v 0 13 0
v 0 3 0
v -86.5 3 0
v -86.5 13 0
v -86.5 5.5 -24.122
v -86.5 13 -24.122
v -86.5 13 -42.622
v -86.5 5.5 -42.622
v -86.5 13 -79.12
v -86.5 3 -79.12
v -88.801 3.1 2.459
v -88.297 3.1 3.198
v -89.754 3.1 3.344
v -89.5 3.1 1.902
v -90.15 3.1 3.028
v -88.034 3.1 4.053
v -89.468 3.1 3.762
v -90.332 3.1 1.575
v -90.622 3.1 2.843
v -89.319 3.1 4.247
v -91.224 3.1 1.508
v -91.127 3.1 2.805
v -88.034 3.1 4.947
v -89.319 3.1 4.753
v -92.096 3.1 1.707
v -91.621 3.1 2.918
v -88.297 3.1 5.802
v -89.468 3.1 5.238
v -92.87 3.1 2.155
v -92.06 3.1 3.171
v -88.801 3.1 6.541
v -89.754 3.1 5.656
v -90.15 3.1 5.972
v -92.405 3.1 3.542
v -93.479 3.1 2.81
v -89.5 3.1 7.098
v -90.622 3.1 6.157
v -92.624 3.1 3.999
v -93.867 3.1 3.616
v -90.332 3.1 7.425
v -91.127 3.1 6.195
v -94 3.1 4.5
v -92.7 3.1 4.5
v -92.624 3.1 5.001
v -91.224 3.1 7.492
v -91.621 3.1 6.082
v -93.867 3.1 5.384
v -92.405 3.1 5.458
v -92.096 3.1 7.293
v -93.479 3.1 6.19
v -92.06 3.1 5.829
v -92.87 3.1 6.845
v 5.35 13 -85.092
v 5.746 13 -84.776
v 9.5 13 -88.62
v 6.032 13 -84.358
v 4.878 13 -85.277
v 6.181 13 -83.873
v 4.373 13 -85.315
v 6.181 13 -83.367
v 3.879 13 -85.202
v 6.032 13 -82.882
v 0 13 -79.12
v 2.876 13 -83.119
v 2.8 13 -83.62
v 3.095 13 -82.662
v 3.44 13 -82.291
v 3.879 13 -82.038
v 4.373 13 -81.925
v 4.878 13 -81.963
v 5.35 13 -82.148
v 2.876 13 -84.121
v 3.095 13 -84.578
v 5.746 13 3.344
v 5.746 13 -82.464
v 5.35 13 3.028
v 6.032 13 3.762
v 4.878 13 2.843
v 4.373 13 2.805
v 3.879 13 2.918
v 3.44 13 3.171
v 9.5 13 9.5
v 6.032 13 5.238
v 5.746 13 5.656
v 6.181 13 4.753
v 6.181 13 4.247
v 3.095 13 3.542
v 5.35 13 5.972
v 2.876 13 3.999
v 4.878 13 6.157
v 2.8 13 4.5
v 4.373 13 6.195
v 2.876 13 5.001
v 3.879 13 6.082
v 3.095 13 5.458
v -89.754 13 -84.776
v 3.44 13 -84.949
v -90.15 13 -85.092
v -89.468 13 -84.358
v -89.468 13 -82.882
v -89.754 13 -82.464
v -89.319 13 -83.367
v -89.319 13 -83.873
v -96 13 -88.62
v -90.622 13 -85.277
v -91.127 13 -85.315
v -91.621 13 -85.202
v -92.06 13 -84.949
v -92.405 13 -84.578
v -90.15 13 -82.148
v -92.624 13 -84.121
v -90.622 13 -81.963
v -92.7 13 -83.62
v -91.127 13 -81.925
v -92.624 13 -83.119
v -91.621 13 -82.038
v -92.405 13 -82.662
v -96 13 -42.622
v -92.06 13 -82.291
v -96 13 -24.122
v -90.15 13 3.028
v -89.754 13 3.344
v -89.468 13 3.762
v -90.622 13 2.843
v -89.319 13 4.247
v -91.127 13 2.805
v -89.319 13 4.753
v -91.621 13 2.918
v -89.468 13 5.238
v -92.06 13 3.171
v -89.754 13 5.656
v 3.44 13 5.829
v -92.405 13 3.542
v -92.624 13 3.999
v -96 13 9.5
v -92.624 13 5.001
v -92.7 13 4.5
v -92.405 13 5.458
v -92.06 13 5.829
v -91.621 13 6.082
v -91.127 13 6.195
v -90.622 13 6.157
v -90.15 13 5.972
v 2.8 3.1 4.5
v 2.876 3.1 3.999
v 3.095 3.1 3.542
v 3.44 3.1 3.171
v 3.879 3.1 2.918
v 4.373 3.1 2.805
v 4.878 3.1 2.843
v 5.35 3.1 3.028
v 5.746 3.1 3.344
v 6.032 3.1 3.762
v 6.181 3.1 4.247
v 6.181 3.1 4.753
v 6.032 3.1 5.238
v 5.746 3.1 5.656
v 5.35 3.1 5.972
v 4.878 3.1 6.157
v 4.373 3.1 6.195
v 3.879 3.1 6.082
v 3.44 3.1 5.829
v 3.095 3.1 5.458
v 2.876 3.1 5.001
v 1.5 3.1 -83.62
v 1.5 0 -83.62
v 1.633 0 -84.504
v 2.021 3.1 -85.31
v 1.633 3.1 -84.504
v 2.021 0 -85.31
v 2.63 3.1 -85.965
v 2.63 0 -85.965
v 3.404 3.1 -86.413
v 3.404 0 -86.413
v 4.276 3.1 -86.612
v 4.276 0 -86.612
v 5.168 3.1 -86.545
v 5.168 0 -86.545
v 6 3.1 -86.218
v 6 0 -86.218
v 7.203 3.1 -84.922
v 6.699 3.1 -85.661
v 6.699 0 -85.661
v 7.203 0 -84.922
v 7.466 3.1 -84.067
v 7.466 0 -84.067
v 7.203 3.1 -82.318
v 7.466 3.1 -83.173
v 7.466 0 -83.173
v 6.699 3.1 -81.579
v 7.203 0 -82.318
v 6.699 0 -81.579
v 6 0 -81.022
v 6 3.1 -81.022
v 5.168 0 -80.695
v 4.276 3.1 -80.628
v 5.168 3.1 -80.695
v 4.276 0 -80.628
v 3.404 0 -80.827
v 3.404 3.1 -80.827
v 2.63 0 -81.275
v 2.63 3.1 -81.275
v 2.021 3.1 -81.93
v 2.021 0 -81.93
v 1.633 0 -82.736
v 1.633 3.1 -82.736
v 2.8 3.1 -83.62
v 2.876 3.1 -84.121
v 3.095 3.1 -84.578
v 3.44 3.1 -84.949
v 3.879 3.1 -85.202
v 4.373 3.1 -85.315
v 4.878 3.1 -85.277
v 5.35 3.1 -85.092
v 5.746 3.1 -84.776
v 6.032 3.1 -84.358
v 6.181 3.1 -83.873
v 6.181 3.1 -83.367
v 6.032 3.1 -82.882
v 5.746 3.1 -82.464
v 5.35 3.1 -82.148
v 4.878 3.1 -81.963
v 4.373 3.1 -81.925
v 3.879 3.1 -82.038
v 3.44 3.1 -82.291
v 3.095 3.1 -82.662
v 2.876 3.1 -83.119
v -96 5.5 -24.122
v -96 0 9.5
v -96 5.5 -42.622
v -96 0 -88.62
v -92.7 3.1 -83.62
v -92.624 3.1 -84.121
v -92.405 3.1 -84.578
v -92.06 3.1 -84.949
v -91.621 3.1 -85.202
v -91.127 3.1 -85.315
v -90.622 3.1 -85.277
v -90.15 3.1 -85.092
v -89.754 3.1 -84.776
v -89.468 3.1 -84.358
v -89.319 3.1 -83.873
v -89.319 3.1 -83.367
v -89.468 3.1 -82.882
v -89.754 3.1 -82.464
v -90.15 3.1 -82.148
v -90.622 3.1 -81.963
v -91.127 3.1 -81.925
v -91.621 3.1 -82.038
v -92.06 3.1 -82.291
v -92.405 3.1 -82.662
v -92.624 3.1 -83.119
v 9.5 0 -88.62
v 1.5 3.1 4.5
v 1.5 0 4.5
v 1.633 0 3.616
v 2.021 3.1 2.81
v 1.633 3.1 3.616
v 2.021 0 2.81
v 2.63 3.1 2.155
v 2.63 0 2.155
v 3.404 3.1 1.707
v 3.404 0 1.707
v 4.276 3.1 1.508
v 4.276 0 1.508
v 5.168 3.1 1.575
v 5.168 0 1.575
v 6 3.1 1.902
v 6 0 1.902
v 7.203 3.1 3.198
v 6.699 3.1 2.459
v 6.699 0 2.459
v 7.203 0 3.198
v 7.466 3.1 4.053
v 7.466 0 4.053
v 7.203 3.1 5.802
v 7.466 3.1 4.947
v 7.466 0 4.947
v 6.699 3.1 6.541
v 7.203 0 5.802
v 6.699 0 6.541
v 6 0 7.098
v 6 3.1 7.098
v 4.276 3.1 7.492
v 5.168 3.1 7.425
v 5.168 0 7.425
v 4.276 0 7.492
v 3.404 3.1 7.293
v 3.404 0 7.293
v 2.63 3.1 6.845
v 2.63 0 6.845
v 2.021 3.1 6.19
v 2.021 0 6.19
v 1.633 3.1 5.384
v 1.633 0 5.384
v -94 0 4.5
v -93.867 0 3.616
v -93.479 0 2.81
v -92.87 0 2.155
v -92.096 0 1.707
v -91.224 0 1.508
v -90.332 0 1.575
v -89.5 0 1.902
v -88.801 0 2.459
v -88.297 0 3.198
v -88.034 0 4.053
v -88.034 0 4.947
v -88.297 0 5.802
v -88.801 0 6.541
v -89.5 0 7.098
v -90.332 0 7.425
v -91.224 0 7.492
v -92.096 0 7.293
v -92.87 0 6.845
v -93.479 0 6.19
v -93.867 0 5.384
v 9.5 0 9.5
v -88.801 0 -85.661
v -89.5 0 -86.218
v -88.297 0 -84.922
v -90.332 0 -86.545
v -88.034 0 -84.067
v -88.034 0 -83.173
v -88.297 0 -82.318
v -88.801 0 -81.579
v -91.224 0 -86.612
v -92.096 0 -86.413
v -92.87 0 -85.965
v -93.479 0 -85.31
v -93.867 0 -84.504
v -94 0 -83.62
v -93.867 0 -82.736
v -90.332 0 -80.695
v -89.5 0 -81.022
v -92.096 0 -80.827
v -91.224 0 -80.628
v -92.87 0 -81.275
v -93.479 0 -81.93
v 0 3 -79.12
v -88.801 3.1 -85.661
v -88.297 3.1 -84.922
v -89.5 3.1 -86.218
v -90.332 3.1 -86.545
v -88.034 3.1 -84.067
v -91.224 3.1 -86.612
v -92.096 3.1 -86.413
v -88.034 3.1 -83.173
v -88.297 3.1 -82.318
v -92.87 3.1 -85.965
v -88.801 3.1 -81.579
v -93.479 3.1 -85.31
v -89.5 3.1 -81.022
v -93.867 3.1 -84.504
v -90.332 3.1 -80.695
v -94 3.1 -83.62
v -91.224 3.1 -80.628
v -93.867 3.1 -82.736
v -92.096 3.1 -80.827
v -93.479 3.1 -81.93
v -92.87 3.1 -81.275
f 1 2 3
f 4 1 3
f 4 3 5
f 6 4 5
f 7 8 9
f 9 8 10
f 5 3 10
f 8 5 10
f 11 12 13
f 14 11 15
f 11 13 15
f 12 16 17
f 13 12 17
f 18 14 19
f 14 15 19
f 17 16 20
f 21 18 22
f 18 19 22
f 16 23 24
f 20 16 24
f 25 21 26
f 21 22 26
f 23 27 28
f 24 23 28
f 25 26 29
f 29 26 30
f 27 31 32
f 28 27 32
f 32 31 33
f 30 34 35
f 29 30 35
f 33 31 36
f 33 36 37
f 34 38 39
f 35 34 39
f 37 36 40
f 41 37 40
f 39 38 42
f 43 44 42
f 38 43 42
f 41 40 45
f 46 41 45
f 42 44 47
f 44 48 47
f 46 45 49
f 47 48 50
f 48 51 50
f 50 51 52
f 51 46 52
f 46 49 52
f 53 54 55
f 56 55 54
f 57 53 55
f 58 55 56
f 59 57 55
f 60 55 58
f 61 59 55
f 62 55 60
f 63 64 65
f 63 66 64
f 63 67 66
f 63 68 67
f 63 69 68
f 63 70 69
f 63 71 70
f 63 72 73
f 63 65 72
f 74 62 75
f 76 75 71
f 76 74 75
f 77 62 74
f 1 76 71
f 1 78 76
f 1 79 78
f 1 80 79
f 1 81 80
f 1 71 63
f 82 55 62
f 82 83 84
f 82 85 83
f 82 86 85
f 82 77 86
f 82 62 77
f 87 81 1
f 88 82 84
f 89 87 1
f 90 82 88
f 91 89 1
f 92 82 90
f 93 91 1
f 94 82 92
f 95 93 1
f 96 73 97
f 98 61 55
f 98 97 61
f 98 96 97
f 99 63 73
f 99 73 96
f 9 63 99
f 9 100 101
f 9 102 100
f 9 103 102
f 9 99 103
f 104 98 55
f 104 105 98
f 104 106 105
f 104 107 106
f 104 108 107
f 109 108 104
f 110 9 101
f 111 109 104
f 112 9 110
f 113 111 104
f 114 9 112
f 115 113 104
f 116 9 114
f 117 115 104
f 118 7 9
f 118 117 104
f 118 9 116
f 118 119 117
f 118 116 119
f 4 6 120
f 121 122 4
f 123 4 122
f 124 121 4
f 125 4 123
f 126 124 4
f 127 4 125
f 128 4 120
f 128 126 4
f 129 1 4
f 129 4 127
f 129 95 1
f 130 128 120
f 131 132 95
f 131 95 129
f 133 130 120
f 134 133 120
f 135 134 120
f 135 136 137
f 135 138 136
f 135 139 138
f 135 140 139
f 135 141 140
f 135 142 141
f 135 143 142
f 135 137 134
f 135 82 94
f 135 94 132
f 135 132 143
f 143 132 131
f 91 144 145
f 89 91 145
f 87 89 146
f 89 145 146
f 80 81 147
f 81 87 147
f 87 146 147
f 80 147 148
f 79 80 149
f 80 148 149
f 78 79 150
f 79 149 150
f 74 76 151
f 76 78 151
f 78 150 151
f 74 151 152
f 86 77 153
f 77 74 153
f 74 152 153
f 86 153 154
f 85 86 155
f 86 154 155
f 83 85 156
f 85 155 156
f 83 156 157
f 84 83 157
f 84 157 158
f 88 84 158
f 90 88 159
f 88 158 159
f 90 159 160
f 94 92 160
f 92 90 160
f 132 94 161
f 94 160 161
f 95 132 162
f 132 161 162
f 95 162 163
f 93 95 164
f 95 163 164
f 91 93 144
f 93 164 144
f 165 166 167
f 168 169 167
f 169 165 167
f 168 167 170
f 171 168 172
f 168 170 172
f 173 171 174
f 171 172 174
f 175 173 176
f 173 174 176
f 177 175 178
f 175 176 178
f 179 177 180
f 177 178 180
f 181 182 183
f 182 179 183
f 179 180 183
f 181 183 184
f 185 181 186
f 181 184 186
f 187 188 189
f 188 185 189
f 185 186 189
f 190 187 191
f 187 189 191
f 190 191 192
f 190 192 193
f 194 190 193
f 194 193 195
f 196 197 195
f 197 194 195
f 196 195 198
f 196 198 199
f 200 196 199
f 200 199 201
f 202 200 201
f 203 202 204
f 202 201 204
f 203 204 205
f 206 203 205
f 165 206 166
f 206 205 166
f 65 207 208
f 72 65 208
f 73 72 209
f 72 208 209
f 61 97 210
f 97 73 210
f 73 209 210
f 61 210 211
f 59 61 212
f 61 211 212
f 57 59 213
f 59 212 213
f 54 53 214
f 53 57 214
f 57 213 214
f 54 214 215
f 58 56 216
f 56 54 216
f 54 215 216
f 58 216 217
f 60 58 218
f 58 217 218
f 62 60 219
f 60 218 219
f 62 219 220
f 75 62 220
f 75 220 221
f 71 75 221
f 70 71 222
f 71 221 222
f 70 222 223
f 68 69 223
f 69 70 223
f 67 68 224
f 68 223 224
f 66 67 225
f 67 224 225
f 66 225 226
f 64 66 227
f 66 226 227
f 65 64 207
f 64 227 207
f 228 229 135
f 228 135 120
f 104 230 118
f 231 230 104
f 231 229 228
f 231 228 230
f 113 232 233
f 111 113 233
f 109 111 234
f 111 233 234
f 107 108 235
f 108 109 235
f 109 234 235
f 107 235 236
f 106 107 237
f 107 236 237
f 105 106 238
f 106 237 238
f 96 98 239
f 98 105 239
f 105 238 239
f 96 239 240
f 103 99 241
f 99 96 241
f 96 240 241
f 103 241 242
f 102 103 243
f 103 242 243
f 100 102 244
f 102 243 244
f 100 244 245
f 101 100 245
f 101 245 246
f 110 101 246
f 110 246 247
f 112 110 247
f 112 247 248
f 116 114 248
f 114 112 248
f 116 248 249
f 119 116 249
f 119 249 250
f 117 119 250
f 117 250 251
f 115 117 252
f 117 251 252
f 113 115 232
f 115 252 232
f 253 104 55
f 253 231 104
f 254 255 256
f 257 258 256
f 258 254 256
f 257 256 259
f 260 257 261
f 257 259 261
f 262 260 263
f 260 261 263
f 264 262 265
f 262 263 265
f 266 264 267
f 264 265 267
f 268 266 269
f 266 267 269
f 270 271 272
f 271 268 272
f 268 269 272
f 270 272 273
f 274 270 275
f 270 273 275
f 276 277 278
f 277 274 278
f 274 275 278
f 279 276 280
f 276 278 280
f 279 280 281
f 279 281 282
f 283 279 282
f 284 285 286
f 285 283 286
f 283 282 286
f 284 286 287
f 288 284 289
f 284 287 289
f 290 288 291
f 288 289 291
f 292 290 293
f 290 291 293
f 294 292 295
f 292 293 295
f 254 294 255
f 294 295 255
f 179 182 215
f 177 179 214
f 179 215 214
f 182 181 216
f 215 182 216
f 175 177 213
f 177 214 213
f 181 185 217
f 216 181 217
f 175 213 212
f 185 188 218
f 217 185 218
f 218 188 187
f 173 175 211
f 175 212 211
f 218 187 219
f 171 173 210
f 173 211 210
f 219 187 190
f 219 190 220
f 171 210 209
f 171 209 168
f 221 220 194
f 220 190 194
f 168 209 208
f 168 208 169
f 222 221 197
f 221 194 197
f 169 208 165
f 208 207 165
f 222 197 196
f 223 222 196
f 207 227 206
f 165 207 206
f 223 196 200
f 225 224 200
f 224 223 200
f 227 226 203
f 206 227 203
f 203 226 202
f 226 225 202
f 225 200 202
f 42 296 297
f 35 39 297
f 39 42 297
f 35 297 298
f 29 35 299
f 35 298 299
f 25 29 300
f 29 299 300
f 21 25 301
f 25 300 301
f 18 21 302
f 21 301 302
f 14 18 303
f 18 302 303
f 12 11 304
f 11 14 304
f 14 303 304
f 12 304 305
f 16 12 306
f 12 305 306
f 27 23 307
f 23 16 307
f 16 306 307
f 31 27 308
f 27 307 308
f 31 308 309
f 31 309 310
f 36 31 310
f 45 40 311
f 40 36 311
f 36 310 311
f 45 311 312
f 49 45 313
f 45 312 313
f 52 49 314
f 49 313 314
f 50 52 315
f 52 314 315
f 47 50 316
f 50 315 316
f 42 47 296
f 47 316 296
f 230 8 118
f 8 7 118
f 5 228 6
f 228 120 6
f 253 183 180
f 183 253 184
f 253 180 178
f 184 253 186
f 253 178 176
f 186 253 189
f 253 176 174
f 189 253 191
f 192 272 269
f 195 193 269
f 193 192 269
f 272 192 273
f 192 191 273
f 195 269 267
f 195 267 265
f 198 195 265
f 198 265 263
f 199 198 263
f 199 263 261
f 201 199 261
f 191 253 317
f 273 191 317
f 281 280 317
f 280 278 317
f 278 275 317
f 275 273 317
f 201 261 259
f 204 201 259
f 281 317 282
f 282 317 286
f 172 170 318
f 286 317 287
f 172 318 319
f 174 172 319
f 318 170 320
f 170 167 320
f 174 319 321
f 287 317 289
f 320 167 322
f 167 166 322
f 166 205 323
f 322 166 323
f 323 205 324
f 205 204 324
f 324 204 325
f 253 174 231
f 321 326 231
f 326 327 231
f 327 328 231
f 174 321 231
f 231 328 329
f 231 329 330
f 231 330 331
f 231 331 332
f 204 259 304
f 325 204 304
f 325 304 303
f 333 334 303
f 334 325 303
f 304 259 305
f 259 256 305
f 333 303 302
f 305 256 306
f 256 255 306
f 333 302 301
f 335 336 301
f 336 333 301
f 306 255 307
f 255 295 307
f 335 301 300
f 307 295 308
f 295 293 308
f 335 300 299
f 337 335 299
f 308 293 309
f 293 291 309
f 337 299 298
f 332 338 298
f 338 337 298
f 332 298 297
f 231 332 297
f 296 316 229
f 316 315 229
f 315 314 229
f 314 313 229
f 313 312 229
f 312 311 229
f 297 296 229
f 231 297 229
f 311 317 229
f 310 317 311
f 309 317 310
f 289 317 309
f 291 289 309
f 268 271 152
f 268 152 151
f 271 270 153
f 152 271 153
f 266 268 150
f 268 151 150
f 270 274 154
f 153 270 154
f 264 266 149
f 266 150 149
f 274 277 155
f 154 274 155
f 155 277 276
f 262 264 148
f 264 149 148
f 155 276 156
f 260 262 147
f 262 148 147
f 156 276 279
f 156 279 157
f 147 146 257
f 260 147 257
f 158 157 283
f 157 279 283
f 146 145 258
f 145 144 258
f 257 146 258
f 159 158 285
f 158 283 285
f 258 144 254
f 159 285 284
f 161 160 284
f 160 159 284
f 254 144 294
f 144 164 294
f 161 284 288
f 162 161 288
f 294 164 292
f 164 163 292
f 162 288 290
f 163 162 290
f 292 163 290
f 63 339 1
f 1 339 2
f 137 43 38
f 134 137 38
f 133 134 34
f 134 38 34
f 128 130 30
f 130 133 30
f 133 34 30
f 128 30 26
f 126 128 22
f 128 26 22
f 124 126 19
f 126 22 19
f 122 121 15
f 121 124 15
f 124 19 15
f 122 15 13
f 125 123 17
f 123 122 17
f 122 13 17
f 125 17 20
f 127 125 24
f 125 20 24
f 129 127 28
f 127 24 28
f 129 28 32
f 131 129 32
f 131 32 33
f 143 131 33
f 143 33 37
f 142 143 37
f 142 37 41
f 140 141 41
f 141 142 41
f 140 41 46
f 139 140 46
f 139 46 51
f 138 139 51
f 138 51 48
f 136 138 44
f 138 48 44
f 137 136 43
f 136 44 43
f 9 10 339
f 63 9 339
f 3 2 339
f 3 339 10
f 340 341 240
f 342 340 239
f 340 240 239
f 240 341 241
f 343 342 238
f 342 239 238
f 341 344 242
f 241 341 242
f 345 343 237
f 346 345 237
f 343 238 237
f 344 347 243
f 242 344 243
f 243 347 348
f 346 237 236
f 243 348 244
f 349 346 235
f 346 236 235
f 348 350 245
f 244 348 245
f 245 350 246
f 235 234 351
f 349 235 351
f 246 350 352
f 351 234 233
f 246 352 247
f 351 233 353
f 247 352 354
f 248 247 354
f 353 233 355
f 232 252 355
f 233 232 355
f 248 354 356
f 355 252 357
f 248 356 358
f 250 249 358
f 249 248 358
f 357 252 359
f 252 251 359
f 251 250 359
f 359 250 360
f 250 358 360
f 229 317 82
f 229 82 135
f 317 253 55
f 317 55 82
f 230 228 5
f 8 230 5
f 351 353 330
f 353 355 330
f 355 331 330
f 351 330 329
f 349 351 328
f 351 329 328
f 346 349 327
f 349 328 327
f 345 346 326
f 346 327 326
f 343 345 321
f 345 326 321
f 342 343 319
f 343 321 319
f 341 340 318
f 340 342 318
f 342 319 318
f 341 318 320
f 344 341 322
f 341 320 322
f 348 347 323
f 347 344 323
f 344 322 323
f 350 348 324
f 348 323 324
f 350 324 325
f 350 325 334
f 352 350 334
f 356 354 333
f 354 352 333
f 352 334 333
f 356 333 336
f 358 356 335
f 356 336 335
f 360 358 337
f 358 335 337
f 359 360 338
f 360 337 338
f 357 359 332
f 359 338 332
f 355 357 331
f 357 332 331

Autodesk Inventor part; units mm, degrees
ref_plane "YZ Plane" through (0, 0, 0) normal (1, 0, 0) x (0, 1, 0)
ref_plane "XZ Plane" through (0, 0, 0) normal (0, 1, 0) x (-1, 0, 0)
ref_plane "XY Plane" through (0, 0, 0) normal (0, 0, 1) x (1, 0, 0)
sketch "Sketch3" plane through (0, 0, 0) normal (0, 1, 0) x (-1, 0, 0)
  line L0 (0, 0) -> (86.5, 0)
  line L1 (86.5, 0) -> (86.5, -79.12)
  line L2 (86.5, -79.12) -> (0, -79.12)
  line L3 (0, -79.12) -> (0, 0)
  line L4 (-9.5, 9.5) -> (96, 9.5)
  line L5 (96, 9.5) -> (96, -88.62)
  line L6 (96, -88.62) -> (-9.5, -88.62)
  line L7 (-9.5, -88.62) -> (-9.5, 9.5)
  circle A0 centre (-4.5, 4.5) radius 1.7
  circle A1 centre (91, 4.5) radius 1.7
  circle A2 centre (-4.5, -83.62) radius 1.7
  circle A3 centre (91, -83.62) radius 1.7
  circle A4 centre (91, 4.5) radius 3
  circle A5 centre (-4.5, 4.5) radius 3
  circle A6 centre (-4.5, -83.62) radius 3
  circle A7 centre (91, -83.62) radius 3
  dimension "d0" = 86.5
  dimension "d1" = 79.12
  dimension "d2" = 105.5
  dimension "d3" = 98.12
  dimension "d4" = 9.5
  dimension "d5" = 9.5
  dimension "d6" = 3.4
  dimension "d7" = 3.4
  dimension "d8" = 3.4
  dimension "d9" = 3.4
  dimension "d10" = 5
  dimension "d11" = 5
  dimension "d12" = 5
  dimension "d13" = 5
  dimension "d14" = 5
  dimension "d15" = 5
  dimension "d16" = 5
  dimension "d17" = 5
  dimension "d18" = 6
  dimension "d19" = 6
  dimension "d20" = 6
  dimension "d21" = 6
extrude "Extrusion1" add sketch "Sketch3" along normal blind 13 contours A4 | A5 | A6 | A7
sketch "Sketch4" plane through (-91, 13, 4.5) normal (0, 1, 0) x (1, 0, 0)
  point P0 (91, 4.5)
extrude "Extrusion2" cut sketch "Sketch3" along normal blind 3.1 contours A4 | A5 | A6 | A7
extrude "Extrusion3" add sketch "Sketch3" along normal blind 13 contours L4 L5 L6 L7
extrude "Extrusion4" add sketch "Sketch3" along normal blind 3 contours L0 L1 L2 L3
sketch "Sketch6" plane through (0, 13, 0) normal (0, 1, 0) x (1, 0, 0)
  line L0 (-96, 88.62) -> (-96, -9.5) projected
  line L1 (-96, 24.122) -> (-86.5, 24.122)
  line L2 (-86.5, 24.122) -> (-86.5, 42.622)
  line L3 (-86.5, 42.622) -> (-96, 42.622)
  line L4 (-96, 42.622) -> (-96, 24.122)
  point P0 (0, 0)
  dimension "d31" = 9.5
  dimension "d32" = 18.5
extrude "Extrusion5" cut sketch "Sketch6" against normal blind 7.5
properties part number "Bottom_Plate"
